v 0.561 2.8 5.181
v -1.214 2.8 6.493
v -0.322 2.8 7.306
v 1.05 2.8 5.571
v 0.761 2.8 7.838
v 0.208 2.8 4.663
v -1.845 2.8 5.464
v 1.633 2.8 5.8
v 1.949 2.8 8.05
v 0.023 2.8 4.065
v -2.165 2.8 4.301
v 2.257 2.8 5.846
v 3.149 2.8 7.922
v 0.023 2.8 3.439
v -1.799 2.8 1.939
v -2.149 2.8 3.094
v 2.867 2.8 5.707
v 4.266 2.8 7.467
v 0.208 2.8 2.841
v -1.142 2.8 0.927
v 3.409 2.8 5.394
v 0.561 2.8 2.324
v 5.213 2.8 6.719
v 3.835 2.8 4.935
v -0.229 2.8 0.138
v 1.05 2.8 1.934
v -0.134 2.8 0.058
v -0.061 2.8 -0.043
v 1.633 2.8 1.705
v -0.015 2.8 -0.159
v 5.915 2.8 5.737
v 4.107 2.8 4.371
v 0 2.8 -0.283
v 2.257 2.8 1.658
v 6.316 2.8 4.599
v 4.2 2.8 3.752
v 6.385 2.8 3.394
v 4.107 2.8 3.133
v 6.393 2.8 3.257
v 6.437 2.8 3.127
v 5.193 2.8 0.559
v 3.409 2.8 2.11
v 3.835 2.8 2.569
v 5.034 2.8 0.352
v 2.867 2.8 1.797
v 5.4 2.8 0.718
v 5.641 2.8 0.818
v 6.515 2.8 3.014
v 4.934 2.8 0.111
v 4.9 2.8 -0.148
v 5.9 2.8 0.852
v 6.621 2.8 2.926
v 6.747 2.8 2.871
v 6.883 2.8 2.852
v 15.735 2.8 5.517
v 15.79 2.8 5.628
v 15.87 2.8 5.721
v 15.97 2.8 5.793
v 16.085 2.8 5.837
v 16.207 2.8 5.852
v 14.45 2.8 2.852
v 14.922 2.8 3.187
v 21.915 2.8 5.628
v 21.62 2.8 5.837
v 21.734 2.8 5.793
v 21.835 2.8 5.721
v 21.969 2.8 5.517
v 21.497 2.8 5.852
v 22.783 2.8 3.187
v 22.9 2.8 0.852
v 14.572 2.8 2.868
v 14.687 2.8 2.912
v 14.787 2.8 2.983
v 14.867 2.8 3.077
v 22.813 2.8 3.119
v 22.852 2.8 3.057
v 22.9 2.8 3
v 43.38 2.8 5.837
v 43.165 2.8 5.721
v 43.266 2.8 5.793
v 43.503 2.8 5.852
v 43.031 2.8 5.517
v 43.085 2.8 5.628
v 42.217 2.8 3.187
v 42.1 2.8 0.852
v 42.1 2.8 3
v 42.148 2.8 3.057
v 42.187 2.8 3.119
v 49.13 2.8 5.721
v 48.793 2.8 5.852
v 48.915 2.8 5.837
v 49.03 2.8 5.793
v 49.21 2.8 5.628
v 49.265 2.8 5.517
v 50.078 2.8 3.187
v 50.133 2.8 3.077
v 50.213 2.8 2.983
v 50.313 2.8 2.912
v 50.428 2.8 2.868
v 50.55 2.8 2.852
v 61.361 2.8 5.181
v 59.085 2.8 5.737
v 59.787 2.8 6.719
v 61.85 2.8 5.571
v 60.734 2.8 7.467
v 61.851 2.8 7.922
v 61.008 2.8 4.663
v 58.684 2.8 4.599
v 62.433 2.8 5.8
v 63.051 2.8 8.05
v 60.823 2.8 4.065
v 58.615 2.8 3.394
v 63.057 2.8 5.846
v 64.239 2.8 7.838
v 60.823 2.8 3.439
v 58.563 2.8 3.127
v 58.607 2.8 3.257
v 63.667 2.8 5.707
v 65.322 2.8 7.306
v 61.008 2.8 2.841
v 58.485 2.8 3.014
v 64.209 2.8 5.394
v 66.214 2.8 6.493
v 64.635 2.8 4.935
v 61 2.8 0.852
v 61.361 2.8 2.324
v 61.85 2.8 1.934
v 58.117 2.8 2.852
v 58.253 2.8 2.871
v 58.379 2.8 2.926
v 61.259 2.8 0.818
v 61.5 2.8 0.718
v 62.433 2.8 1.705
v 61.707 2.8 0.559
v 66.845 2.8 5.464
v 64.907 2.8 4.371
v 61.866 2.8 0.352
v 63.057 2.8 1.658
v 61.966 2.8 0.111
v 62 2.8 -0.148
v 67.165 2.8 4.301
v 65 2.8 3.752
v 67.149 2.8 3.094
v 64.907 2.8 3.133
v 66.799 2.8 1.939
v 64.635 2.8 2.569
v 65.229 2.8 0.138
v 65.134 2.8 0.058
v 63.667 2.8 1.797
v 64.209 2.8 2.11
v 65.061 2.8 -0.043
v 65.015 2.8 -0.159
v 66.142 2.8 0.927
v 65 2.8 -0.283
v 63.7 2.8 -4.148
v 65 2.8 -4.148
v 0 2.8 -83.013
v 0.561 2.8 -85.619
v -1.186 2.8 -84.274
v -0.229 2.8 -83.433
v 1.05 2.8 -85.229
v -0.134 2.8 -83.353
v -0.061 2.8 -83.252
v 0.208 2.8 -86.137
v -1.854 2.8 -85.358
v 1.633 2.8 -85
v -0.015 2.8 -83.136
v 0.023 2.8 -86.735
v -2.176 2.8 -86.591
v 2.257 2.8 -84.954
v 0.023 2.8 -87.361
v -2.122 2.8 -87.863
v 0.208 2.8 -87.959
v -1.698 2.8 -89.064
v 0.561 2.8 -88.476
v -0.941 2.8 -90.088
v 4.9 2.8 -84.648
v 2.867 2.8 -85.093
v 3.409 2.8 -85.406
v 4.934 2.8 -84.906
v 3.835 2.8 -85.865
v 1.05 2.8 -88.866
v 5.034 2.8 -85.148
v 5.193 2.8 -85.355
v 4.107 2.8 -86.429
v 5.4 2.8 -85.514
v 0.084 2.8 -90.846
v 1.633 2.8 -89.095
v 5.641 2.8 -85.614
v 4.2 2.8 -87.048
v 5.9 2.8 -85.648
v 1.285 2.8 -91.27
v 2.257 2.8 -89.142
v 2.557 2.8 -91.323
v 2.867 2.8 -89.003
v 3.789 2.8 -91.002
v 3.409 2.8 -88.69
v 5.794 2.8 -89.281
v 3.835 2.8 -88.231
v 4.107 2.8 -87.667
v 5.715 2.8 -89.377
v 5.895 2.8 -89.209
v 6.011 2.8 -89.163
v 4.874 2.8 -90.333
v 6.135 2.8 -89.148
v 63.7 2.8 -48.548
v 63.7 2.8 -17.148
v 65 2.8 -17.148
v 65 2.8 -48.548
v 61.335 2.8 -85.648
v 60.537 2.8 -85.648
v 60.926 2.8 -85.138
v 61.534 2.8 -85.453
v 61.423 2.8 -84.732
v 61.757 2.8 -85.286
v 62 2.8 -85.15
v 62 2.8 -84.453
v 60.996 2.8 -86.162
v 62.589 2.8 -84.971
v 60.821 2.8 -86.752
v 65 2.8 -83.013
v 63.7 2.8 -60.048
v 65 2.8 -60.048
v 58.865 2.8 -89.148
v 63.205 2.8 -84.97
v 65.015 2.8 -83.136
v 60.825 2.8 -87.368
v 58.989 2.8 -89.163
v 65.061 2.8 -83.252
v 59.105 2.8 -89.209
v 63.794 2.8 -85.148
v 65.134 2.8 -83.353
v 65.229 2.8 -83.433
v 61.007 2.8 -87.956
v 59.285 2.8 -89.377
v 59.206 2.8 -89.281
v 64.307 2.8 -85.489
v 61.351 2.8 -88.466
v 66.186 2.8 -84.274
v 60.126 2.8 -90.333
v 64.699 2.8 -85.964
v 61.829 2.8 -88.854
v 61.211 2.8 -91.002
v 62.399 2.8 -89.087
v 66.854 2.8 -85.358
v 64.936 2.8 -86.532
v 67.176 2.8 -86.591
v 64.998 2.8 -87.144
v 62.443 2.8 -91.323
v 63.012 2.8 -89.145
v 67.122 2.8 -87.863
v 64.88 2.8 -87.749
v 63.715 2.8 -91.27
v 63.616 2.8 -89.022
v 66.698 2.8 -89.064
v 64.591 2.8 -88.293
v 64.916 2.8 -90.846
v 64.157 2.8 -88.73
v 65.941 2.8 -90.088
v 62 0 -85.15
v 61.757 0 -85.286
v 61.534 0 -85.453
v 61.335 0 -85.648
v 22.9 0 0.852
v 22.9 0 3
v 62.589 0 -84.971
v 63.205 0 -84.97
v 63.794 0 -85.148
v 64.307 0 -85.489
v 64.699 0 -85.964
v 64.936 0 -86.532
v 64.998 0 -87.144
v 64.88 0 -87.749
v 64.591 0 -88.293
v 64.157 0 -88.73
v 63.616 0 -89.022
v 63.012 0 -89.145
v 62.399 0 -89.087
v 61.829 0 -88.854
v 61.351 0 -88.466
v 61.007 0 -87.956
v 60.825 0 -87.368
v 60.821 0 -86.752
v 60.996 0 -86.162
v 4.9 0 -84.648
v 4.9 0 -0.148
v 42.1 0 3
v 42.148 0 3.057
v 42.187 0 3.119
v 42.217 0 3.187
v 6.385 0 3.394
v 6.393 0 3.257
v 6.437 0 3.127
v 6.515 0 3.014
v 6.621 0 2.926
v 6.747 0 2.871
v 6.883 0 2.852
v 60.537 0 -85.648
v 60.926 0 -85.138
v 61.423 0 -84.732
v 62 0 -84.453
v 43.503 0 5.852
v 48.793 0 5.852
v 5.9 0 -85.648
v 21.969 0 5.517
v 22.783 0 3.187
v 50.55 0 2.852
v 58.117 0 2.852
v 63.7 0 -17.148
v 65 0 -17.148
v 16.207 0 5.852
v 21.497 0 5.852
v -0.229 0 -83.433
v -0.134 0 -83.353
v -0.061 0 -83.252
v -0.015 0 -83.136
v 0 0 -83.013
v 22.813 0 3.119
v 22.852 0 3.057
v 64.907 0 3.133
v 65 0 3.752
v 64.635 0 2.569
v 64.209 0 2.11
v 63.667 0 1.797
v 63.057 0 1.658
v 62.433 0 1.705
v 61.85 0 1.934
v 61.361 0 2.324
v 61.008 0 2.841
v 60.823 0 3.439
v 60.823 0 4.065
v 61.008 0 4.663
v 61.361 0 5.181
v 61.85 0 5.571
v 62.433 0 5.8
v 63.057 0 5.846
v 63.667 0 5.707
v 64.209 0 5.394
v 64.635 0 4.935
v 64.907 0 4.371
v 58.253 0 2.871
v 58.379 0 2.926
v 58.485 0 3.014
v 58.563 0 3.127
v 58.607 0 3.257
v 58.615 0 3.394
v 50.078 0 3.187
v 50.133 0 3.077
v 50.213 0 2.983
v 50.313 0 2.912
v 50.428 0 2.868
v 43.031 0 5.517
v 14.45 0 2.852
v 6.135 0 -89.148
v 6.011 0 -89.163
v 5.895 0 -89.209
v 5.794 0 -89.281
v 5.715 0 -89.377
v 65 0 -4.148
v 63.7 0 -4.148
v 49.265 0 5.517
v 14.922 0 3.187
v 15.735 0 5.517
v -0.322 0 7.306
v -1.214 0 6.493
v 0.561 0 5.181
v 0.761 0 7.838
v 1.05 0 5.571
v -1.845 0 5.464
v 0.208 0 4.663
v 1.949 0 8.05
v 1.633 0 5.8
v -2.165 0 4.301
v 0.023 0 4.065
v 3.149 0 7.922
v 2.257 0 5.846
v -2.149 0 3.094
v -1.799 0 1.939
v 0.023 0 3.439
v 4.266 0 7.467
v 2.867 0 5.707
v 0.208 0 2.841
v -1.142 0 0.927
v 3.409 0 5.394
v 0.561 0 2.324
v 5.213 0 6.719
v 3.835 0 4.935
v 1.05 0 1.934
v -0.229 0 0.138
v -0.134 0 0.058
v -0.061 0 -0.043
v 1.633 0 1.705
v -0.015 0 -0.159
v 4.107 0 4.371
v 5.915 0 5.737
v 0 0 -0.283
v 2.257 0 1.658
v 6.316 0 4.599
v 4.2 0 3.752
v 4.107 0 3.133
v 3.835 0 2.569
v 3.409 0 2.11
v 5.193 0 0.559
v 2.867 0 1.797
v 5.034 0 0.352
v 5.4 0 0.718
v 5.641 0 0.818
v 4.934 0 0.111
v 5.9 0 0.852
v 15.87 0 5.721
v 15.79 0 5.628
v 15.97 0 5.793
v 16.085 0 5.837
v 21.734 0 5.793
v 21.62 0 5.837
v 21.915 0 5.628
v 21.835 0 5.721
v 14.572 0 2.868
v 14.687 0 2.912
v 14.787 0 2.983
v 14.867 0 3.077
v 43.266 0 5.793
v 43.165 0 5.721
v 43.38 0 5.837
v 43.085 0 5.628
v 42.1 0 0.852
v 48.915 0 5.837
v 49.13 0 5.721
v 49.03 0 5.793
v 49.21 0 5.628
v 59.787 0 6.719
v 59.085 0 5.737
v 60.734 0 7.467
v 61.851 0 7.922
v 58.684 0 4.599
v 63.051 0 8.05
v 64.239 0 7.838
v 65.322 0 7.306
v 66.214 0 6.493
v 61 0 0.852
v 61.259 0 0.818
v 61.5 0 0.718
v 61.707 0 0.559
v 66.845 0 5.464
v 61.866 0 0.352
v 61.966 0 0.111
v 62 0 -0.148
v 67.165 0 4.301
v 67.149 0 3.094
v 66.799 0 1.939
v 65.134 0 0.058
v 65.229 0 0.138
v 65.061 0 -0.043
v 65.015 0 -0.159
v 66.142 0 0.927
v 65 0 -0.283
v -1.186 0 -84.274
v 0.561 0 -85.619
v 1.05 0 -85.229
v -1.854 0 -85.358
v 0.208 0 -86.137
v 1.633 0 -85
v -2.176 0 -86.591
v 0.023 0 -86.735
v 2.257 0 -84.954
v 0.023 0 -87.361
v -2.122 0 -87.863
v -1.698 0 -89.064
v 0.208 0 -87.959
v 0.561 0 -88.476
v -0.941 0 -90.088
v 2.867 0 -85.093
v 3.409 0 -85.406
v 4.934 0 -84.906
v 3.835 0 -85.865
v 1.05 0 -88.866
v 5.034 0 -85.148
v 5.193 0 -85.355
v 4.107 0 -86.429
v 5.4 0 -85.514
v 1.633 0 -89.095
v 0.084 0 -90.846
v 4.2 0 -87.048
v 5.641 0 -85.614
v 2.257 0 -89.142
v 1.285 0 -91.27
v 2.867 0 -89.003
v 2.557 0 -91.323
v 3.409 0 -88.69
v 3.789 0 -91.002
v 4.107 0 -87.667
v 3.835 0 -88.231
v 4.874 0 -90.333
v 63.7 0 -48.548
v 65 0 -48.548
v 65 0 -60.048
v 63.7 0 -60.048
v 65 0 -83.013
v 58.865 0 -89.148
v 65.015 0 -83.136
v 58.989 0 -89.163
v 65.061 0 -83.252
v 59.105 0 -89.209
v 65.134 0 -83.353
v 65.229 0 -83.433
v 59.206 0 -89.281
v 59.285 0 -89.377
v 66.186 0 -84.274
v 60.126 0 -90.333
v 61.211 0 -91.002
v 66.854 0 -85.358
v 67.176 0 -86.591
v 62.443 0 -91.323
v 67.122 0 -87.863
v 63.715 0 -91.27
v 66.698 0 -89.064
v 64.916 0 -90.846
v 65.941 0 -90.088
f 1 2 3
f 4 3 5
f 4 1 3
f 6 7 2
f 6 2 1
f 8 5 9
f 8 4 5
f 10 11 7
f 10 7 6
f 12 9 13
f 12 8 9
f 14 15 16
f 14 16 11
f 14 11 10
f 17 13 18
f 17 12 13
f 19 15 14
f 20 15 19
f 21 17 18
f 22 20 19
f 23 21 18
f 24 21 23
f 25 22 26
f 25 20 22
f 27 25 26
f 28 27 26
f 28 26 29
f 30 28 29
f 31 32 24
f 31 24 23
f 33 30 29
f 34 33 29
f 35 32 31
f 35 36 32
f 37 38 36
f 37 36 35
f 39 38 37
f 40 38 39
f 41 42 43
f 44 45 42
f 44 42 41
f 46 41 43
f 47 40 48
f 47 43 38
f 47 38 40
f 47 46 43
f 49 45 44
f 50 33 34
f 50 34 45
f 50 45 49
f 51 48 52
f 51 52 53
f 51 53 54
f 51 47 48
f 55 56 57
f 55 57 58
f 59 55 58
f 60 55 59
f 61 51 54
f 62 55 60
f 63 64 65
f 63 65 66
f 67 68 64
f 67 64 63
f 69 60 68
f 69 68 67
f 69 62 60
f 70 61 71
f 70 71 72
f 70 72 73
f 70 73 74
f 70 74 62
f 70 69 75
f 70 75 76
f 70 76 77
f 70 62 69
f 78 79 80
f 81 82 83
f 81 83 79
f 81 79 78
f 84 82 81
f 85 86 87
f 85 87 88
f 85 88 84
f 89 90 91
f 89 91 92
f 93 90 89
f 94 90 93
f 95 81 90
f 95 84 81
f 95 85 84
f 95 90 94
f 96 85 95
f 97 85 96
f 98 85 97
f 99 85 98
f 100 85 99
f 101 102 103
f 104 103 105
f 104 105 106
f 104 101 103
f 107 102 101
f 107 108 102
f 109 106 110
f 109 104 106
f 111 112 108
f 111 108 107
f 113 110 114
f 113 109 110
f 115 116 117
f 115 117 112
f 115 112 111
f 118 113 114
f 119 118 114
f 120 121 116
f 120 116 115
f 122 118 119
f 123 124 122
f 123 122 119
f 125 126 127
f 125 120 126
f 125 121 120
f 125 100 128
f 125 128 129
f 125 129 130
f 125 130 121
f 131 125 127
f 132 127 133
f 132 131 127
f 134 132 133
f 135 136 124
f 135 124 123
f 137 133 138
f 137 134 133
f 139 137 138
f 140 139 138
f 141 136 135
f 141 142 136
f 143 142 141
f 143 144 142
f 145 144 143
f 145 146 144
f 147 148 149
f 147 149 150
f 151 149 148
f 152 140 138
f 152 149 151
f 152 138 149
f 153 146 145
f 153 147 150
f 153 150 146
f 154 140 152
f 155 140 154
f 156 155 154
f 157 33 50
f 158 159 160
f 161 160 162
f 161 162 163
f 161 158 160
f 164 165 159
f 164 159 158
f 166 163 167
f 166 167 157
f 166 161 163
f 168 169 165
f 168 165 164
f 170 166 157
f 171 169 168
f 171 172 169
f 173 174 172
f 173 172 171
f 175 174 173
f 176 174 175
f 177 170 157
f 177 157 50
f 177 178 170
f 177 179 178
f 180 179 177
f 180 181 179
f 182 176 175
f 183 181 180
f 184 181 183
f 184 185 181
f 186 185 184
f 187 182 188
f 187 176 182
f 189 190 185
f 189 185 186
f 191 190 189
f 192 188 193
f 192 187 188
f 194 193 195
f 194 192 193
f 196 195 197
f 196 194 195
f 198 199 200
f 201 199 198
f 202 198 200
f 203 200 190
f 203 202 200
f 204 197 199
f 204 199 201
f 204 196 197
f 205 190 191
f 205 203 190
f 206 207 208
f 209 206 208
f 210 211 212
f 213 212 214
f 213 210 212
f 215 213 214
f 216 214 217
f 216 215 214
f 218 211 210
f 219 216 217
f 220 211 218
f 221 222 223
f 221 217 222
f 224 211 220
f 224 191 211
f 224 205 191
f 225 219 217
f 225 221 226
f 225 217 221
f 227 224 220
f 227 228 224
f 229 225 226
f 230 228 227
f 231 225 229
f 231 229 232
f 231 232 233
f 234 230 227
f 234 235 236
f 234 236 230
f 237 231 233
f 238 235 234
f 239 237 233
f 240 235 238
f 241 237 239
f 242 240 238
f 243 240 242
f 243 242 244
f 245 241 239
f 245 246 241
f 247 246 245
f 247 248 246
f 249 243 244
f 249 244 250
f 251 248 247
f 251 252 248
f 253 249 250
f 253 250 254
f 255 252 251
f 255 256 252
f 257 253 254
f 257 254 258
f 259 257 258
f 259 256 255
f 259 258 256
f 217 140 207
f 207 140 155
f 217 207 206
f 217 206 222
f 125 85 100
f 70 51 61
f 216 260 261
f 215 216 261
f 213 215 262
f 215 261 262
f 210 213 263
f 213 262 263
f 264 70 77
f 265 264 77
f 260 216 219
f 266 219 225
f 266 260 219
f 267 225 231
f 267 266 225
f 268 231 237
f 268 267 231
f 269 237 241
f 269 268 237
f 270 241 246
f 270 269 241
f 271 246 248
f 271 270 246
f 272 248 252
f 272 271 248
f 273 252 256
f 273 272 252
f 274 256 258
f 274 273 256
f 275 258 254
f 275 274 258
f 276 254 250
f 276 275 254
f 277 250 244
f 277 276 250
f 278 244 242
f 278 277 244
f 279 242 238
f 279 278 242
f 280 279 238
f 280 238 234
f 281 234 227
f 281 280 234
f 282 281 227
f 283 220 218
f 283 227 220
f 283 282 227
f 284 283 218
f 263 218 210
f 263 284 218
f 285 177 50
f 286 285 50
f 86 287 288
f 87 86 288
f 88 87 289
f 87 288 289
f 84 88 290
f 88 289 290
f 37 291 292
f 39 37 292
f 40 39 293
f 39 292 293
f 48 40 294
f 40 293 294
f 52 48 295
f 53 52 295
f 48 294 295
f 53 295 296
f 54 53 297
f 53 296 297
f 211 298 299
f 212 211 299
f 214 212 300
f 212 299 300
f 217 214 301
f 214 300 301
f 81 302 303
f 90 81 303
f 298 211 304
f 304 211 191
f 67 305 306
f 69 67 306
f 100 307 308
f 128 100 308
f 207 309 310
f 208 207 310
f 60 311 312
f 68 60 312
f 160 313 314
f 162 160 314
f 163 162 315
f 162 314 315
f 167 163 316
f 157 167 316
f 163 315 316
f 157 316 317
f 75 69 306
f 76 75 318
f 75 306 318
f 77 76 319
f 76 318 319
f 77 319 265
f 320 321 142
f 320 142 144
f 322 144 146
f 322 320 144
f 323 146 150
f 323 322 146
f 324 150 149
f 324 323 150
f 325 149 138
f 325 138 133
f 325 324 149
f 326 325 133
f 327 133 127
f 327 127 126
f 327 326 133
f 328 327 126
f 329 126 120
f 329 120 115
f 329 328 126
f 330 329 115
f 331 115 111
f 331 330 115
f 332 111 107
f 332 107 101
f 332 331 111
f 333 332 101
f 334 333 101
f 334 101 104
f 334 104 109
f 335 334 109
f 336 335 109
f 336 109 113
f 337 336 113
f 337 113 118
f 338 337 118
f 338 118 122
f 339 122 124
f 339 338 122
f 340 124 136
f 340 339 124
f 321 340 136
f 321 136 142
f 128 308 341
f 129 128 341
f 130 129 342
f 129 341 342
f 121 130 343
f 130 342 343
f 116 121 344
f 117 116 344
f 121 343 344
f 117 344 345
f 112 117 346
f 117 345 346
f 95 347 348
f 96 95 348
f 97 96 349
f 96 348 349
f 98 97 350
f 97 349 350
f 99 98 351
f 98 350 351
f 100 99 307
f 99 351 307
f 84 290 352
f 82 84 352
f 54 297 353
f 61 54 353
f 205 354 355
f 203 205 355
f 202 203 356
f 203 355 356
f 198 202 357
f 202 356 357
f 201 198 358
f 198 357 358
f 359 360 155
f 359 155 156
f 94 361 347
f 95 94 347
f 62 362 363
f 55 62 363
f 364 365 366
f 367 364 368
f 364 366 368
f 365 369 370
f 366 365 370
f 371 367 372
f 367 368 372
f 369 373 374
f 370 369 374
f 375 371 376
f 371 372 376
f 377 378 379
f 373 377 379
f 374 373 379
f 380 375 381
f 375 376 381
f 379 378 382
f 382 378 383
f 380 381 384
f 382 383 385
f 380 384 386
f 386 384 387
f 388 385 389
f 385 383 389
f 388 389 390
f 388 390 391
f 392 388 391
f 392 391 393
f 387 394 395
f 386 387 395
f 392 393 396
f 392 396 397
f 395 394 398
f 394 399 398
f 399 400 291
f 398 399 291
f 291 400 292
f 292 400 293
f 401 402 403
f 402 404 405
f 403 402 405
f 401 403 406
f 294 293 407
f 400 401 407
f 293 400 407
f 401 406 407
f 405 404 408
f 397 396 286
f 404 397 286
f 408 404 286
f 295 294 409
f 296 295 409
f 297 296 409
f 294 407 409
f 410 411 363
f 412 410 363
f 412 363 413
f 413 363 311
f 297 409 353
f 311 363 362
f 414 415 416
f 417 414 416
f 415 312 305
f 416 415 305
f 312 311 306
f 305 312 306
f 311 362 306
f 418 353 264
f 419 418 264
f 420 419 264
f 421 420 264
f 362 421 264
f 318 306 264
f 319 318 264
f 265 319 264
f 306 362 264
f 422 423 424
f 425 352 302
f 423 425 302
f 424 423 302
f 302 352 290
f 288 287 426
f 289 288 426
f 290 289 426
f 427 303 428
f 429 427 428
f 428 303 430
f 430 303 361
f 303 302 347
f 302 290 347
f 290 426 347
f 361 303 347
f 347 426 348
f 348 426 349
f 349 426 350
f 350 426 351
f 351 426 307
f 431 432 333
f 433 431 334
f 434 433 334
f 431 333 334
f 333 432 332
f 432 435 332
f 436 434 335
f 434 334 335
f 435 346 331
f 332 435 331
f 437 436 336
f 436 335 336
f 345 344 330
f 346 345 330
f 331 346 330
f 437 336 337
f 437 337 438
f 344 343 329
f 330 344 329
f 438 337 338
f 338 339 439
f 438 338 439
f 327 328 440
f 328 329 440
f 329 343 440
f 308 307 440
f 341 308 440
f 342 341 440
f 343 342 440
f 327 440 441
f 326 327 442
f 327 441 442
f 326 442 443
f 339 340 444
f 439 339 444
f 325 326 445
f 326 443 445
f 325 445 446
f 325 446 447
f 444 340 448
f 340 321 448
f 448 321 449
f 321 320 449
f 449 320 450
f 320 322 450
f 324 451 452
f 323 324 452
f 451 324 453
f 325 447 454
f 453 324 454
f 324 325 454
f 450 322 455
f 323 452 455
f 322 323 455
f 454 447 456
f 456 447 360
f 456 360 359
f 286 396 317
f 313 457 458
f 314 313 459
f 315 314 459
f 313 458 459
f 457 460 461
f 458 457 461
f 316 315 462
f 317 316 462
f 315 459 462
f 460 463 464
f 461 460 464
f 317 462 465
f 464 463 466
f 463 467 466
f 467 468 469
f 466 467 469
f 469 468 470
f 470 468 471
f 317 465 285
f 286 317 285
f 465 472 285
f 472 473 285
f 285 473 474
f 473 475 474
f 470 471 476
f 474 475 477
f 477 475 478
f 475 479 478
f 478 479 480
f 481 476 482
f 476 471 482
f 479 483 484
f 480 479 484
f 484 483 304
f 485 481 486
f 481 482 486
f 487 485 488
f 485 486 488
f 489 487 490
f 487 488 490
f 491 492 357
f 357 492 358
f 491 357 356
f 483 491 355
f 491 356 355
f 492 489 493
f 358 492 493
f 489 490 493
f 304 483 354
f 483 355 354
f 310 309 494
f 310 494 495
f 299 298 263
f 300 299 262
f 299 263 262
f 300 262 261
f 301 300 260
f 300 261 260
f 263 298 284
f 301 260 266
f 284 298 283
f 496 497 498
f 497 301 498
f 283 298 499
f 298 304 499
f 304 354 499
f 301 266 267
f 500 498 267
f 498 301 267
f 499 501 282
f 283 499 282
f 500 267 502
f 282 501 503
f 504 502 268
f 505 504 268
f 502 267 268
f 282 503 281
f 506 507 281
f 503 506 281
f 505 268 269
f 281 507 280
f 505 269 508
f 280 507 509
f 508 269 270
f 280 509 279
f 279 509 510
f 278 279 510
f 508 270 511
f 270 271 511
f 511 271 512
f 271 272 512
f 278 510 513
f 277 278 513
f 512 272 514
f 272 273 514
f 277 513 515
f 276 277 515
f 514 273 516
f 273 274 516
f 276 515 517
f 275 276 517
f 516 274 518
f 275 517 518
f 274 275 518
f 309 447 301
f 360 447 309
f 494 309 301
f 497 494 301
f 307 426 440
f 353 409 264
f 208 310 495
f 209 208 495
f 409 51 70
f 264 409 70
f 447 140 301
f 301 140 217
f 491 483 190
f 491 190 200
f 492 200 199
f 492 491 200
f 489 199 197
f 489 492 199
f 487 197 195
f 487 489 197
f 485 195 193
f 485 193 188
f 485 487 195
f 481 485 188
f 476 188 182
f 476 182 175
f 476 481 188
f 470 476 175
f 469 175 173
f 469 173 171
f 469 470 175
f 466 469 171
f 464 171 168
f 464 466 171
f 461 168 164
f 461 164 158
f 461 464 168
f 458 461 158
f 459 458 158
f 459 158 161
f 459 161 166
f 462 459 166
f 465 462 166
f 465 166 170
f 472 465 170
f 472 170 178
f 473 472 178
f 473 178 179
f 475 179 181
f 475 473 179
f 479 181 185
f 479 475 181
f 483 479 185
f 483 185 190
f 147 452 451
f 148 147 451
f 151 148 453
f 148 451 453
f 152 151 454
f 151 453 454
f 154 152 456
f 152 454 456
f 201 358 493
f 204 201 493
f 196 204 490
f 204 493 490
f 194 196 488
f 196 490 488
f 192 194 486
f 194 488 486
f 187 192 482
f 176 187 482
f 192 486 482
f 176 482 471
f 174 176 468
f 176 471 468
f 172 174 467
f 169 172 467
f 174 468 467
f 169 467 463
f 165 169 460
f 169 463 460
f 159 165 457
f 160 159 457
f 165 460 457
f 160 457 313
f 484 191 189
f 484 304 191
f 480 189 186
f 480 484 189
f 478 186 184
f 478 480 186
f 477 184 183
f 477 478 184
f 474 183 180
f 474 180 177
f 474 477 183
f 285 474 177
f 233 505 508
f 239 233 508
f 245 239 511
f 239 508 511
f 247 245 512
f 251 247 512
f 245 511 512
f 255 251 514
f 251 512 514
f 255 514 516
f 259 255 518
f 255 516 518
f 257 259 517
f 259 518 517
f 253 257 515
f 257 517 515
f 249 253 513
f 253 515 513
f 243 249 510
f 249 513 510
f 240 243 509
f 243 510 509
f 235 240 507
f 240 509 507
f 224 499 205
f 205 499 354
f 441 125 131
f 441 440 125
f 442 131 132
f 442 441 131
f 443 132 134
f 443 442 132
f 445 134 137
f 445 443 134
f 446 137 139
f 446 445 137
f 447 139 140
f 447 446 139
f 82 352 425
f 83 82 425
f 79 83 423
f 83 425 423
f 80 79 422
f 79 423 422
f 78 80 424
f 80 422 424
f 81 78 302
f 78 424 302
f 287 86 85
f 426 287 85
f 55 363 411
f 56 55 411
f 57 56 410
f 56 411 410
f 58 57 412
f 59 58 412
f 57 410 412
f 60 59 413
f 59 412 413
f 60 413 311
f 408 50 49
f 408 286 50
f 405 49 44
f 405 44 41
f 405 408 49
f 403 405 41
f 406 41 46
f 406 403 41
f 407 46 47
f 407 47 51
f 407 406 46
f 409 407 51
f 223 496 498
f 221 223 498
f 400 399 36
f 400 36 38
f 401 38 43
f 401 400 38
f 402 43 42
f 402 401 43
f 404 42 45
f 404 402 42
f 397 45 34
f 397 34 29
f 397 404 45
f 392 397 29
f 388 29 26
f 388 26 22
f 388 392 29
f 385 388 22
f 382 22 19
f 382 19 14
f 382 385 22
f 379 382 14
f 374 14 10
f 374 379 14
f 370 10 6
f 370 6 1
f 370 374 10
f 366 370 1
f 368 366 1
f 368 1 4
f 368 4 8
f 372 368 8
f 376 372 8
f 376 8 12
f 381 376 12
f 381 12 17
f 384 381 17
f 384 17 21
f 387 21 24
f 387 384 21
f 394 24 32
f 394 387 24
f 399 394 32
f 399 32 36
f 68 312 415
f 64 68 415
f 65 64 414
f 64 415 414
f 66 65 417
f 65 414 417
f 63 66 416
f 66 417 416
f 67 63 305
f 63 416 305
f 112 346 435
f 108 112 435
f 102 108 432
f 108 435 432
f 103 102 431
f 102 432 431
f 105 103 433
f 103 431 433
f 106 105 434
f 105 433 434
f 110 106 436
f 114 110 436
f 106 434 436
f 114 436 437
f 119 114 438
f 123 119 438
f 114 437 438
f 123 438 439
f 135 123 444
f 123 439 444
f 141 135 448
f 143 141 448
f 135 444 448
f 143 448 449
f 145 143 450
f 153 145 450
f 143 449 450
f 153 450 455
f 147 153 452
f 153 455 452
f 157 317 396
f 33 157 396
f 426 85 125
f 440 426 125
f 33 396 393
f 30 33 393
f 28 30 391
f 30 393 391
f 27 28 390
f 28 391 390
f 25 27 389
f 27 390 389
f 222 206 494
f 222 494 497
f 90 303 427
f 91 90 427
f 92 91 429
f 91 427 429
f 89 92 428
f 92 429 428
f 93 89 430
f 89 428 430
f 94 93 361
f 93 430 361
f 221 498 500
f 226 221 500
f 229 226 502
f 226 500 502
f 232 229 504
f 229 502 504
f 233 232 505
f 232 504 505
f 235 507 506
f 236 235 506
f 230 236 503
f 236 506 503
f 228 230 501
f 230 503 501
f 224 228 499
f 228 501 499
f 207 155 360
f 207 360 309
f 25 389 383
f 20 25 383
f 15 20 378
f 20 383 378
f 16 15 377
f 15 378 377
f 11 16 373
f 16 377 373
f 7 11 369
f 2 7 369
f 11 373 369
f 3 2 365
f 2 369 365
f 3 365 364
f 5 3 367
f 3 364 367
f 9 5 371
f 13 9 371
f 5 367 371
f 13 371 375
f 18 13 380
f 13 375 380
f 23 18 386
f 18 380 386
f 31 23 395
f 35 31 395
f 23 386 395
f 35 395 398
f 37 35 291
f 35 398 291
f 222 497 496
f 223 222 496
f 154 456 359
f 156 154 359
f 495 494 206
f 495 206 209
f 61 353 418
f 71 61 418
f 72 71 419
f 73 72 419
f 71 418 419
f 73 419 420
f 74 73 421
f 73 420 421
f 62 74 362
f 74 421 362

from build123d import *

# Parameters (mm, degrees)
BASEPLATE_OUTLINE_R = 2.1
BASEPLATE_DEPTH     = 2.8
CUT_EXTRUDE1_REACH  = 115.438
FILLET1_R           = 1
CUT_EXTRUDE2_REACH  = 115.438
SKETCH4_W           = 1.3
SKETCH4_H           = 11.5
SKETCH4_H_2         = 13
BOSS_EXTRUDE1_START = -2.8
BOSS_EXTRUDE1_DEPTH = 2.8


# Read off the part's stored shape, not the designer's step: BasePlate
with BuildPart() as part:
    # BasePlate outline → BasePlate (new body)
    with BuildSketch(Plane(origin=(0, 0, 0), x_dir=(1, 0, 0), z_dir=(0, 1, 0))):
        with BuildLine():
            Line((43.502626614, -5.852332608), (48.792614178, -5.852332608))
            ThreePointArc((48.792614178, -5.852332608), (49.082078508, -5.760021707), (49.264659986, -5.517174213))
            Line((49.264659986, -5.517174213), (50.078201202, -3.187491002))
            ThreePointArc((50.078201202, -3.187491002), (50.26078268, -2.944643509), (50.55024701, -2.852332608))
            Line((50.55024701, -2.852332608), (58.116695703, -2.852332608))
            ThreePointArc((58.116695703, -2.852332608), (58.484685739, -3.013831008), (58.614956567, -3.393999275))
            ThreePointArc((58.614956567, -3.393999275), (64.799237397, -7.61016844), (65.229166667, -0.137781095))
            ThreePointArc((65.229166667, -0.137781095), (65.061014427, 0.043158816), (65, 0.282515593))
            Line((65, 0.282515593), (65, 83.012819192))
            ThreePointArc((65, 83.012819192), (65.061014427, 83.252175969), (65.229166667, 83.433115879))
            ThreePointArc((65.229166667, 83.433115879), (65.940559159, 90.088226551), (59.285448487, 89.376834059))
            ThreePointArc((59.285448487, 89.376834059), (59.104508577, 89.208681819), (58.8651518, 89.147667392))
            Line((58.8651518, 89.147667392), (6.1348482, 89.147667392))
            ThreePointArc((6.1348482, 89.147667392), (5.895491423, 89.208681819), (5.714551513, 89.376834059))
            ThreePointArc((5.714551513, 89.376834059), (-0.940559159, 90.088226551), (-0.229166667, 83.433115879))
            ThreePointArc((-0.229166667, 83.433115879), (-0.061014427, 83.252175969), (0, 83.012819192))
            Line((0, 83.012819192), (0, 0.282515593))
            ThreePointArc((0, 0.282515593), (-0.061014427, 0.043158816), (-0.229166667, -0.137781095))
            ThreePointArc((-0.229166667, -0.137781095), (0.200762603, -7.61016844), (6.385043433, -3.393999275))
            ThreePointArc((6.385043433, -3.393999275), (6.515314261, -3.013831008), (6.883304297, -2.852332608))
            Line((6.883304297, -2.852332608), (14.44975299, -2.852332608))
            ThreePointArc((14.44975299, -2.852332608), (14.73921732, -2.944643509), (14.921798798, -3.187491002))
            Line((14.921798798, -3.187491002), (15.735340014, -5.517174213))
            ThreePointArc((15.735340014, -5.517174213), (15.917921492, -5.760021707), (16.207385822, -5.852332608))
            Line((16.207385822, -5.852332608), (21.497373386, -5.852332608))
            ThreePointArc((21.497373386, -5.852332608), (21.786837716, -5.760021707), (21.969419194, -5.517174213))
            Line((21.969419194, -5.517174213), (22.78296041, -3.187491002))
            ThreePointArc((22.78296041, -3.187491002), (22.965541888, -2.944643509), (23.255006218, -2.852332608))
            Line((23.255006218, -2.852332608), (41.744993782, -2.852332608))
            ThreePointArc((41.744993782, -2.852332608), (42.034458112, -2.944643509), (42.21703959, -3.187491002))
            Line((42.21703959, -3.187491002), (43.030580806, -5.517174213))
            ThreePointArc((43.030580806, -5.517174213), (43.213162284, -5.760021707), (43.502626614, -5.852332608))
        make_face()
        with Locations((2.1, -3.752332608)):
            Circle(BASEPLATE_OUTLINE_R, mode=Mode.SUBTRACT)
        with Locations((62.9, -3.752332608)):
            Circle(BASEPLATE_OUTLINE_R, mode=Mode.SUBTRACT)
        with Locations((2.1, 87.047667392)):
            Circle(BASEPLATE_OUTLINE_R, mode=Mode.SUBTRACT)
        with Locations((62.9, 87.047667392)):
            Circle(BASEPLATE_OUTLINE_R, mode=Mode.SUBTRACT)
    extrude(amount=BASEPLATE_DEPTH)

    # Sketch3 → Cut-Extrude1 (cut, up to next)
    with BuildSketch(Plane(origin=(0, 2.8, 0), x_dir=(1, 0, 0), z_dir=(0, 1, 0)), mode=Mode.PRIVATE) as cut_extrude1_sk1:
        Polygon((4.9, 85.647667392), (4.9, -0.852332608), (22.9, -0.852332608), (22.9, -3.00023804), (42.1, -3.00023804), (42.1, -0.852332608), (62, -0.852332608), (62, 85.647667392), align=None)
    cut_extrude1_tool1 = extrude(cut_extrude1_sk1.sketch, amount=-CUT_EXTRUDE1_REACH, mode=Mode.PRIVATE) & part.part
    add(cut_extrude1_tool1.solids().sort_by_distance((33.442134, 2.8, -42.030646))[0], mode=Mode.SUBTRACT)

    # Fillet1
    fillet1_edges = [part.edges().sort_by_distance(p)[0] for p in [
        (4.9, 1.4, -85.647667392),
        (62, 1.4, 0.852332608),
        (4.9, 1.4, 0.852332608),
    ]]
    fillet(fillet1_edges, radius=FILLET1_R)

    # Sketch4 → Cut-Extrude2 (cut, up to next)
    with BuildSketch(Plane(origin=(0, 2.8, 0), x_dir=(1, 0, 0), z_dir=(0, 1, 0)), mode=Mode.PRIVATE) as cut_extrude2_sk1:
        with Locations((64.35, 54.297667392)):
            Rectangle(SKETCH4_W, SKETCH4_H)
    cut_extrude2_tool1 = extrude(cut_extrude2_sk1.sketch, amount=-CUT_EXTRUDE2_REACH, mode=Mode.PRIVATE) & part.part
    # Sketch4 → Cut-Extrude2 (cut, up to next)
    with BuildSketch(Plane(origin=(0, 2.8, 0), x_dir=(1, 0, 0), z_dir=(0, 1, 0)), mode=Mode.PRIVATE) as cut_extrude2_sk2:
        with Locations((64.35, 10.647667392)):
            Rectangle(SKETCH4_W, SKETCH4_H_2)
    cut_extrude2_tool2 = extrude(cut_extrude2_sk2.sketch, amount=-CUT_EXTRUDE2_REACH, mode=Mode.PRIVATE) & part.part
    add(cut_extrude2_tool1.solids().sort_by_distance((64.35, 2.8, -54.297667))[0], mode=Mode.SUBTRACT)
    add(cut_extrude2_tool2.solids().sort_by_distance((64.35, 2.8, -10.647667))[0], mode=Mode.SUBTRACT)

    # Sketch5 → Boss-Extrude1 (add)
    with BuildSketch(Plane(origin=(0, 2.8, 0), x_dir=(1, 0, 0), z_dir=(0, 1, 0)).offset(BOSS_EXTRUDE1_START)):
        with BuildLine():
            Line((61.334752416, 85.647667392), (60.536822695, 85.647667392))
            ThreePointArc((60.536822695, 85.647667392), (61.162428481, 84.920356368), (62, 84.45255526))
            Line((62, 84.45255526), (62, 85.150300796))
            ThreePointArc((62, 85.150300796), (61.64254034, 85.365765134), (61.334752416, 85.647667392))
        make_face()
    extrude(amount=BOSS_EXTRUDE1_DEPTH)


solid = part.part
